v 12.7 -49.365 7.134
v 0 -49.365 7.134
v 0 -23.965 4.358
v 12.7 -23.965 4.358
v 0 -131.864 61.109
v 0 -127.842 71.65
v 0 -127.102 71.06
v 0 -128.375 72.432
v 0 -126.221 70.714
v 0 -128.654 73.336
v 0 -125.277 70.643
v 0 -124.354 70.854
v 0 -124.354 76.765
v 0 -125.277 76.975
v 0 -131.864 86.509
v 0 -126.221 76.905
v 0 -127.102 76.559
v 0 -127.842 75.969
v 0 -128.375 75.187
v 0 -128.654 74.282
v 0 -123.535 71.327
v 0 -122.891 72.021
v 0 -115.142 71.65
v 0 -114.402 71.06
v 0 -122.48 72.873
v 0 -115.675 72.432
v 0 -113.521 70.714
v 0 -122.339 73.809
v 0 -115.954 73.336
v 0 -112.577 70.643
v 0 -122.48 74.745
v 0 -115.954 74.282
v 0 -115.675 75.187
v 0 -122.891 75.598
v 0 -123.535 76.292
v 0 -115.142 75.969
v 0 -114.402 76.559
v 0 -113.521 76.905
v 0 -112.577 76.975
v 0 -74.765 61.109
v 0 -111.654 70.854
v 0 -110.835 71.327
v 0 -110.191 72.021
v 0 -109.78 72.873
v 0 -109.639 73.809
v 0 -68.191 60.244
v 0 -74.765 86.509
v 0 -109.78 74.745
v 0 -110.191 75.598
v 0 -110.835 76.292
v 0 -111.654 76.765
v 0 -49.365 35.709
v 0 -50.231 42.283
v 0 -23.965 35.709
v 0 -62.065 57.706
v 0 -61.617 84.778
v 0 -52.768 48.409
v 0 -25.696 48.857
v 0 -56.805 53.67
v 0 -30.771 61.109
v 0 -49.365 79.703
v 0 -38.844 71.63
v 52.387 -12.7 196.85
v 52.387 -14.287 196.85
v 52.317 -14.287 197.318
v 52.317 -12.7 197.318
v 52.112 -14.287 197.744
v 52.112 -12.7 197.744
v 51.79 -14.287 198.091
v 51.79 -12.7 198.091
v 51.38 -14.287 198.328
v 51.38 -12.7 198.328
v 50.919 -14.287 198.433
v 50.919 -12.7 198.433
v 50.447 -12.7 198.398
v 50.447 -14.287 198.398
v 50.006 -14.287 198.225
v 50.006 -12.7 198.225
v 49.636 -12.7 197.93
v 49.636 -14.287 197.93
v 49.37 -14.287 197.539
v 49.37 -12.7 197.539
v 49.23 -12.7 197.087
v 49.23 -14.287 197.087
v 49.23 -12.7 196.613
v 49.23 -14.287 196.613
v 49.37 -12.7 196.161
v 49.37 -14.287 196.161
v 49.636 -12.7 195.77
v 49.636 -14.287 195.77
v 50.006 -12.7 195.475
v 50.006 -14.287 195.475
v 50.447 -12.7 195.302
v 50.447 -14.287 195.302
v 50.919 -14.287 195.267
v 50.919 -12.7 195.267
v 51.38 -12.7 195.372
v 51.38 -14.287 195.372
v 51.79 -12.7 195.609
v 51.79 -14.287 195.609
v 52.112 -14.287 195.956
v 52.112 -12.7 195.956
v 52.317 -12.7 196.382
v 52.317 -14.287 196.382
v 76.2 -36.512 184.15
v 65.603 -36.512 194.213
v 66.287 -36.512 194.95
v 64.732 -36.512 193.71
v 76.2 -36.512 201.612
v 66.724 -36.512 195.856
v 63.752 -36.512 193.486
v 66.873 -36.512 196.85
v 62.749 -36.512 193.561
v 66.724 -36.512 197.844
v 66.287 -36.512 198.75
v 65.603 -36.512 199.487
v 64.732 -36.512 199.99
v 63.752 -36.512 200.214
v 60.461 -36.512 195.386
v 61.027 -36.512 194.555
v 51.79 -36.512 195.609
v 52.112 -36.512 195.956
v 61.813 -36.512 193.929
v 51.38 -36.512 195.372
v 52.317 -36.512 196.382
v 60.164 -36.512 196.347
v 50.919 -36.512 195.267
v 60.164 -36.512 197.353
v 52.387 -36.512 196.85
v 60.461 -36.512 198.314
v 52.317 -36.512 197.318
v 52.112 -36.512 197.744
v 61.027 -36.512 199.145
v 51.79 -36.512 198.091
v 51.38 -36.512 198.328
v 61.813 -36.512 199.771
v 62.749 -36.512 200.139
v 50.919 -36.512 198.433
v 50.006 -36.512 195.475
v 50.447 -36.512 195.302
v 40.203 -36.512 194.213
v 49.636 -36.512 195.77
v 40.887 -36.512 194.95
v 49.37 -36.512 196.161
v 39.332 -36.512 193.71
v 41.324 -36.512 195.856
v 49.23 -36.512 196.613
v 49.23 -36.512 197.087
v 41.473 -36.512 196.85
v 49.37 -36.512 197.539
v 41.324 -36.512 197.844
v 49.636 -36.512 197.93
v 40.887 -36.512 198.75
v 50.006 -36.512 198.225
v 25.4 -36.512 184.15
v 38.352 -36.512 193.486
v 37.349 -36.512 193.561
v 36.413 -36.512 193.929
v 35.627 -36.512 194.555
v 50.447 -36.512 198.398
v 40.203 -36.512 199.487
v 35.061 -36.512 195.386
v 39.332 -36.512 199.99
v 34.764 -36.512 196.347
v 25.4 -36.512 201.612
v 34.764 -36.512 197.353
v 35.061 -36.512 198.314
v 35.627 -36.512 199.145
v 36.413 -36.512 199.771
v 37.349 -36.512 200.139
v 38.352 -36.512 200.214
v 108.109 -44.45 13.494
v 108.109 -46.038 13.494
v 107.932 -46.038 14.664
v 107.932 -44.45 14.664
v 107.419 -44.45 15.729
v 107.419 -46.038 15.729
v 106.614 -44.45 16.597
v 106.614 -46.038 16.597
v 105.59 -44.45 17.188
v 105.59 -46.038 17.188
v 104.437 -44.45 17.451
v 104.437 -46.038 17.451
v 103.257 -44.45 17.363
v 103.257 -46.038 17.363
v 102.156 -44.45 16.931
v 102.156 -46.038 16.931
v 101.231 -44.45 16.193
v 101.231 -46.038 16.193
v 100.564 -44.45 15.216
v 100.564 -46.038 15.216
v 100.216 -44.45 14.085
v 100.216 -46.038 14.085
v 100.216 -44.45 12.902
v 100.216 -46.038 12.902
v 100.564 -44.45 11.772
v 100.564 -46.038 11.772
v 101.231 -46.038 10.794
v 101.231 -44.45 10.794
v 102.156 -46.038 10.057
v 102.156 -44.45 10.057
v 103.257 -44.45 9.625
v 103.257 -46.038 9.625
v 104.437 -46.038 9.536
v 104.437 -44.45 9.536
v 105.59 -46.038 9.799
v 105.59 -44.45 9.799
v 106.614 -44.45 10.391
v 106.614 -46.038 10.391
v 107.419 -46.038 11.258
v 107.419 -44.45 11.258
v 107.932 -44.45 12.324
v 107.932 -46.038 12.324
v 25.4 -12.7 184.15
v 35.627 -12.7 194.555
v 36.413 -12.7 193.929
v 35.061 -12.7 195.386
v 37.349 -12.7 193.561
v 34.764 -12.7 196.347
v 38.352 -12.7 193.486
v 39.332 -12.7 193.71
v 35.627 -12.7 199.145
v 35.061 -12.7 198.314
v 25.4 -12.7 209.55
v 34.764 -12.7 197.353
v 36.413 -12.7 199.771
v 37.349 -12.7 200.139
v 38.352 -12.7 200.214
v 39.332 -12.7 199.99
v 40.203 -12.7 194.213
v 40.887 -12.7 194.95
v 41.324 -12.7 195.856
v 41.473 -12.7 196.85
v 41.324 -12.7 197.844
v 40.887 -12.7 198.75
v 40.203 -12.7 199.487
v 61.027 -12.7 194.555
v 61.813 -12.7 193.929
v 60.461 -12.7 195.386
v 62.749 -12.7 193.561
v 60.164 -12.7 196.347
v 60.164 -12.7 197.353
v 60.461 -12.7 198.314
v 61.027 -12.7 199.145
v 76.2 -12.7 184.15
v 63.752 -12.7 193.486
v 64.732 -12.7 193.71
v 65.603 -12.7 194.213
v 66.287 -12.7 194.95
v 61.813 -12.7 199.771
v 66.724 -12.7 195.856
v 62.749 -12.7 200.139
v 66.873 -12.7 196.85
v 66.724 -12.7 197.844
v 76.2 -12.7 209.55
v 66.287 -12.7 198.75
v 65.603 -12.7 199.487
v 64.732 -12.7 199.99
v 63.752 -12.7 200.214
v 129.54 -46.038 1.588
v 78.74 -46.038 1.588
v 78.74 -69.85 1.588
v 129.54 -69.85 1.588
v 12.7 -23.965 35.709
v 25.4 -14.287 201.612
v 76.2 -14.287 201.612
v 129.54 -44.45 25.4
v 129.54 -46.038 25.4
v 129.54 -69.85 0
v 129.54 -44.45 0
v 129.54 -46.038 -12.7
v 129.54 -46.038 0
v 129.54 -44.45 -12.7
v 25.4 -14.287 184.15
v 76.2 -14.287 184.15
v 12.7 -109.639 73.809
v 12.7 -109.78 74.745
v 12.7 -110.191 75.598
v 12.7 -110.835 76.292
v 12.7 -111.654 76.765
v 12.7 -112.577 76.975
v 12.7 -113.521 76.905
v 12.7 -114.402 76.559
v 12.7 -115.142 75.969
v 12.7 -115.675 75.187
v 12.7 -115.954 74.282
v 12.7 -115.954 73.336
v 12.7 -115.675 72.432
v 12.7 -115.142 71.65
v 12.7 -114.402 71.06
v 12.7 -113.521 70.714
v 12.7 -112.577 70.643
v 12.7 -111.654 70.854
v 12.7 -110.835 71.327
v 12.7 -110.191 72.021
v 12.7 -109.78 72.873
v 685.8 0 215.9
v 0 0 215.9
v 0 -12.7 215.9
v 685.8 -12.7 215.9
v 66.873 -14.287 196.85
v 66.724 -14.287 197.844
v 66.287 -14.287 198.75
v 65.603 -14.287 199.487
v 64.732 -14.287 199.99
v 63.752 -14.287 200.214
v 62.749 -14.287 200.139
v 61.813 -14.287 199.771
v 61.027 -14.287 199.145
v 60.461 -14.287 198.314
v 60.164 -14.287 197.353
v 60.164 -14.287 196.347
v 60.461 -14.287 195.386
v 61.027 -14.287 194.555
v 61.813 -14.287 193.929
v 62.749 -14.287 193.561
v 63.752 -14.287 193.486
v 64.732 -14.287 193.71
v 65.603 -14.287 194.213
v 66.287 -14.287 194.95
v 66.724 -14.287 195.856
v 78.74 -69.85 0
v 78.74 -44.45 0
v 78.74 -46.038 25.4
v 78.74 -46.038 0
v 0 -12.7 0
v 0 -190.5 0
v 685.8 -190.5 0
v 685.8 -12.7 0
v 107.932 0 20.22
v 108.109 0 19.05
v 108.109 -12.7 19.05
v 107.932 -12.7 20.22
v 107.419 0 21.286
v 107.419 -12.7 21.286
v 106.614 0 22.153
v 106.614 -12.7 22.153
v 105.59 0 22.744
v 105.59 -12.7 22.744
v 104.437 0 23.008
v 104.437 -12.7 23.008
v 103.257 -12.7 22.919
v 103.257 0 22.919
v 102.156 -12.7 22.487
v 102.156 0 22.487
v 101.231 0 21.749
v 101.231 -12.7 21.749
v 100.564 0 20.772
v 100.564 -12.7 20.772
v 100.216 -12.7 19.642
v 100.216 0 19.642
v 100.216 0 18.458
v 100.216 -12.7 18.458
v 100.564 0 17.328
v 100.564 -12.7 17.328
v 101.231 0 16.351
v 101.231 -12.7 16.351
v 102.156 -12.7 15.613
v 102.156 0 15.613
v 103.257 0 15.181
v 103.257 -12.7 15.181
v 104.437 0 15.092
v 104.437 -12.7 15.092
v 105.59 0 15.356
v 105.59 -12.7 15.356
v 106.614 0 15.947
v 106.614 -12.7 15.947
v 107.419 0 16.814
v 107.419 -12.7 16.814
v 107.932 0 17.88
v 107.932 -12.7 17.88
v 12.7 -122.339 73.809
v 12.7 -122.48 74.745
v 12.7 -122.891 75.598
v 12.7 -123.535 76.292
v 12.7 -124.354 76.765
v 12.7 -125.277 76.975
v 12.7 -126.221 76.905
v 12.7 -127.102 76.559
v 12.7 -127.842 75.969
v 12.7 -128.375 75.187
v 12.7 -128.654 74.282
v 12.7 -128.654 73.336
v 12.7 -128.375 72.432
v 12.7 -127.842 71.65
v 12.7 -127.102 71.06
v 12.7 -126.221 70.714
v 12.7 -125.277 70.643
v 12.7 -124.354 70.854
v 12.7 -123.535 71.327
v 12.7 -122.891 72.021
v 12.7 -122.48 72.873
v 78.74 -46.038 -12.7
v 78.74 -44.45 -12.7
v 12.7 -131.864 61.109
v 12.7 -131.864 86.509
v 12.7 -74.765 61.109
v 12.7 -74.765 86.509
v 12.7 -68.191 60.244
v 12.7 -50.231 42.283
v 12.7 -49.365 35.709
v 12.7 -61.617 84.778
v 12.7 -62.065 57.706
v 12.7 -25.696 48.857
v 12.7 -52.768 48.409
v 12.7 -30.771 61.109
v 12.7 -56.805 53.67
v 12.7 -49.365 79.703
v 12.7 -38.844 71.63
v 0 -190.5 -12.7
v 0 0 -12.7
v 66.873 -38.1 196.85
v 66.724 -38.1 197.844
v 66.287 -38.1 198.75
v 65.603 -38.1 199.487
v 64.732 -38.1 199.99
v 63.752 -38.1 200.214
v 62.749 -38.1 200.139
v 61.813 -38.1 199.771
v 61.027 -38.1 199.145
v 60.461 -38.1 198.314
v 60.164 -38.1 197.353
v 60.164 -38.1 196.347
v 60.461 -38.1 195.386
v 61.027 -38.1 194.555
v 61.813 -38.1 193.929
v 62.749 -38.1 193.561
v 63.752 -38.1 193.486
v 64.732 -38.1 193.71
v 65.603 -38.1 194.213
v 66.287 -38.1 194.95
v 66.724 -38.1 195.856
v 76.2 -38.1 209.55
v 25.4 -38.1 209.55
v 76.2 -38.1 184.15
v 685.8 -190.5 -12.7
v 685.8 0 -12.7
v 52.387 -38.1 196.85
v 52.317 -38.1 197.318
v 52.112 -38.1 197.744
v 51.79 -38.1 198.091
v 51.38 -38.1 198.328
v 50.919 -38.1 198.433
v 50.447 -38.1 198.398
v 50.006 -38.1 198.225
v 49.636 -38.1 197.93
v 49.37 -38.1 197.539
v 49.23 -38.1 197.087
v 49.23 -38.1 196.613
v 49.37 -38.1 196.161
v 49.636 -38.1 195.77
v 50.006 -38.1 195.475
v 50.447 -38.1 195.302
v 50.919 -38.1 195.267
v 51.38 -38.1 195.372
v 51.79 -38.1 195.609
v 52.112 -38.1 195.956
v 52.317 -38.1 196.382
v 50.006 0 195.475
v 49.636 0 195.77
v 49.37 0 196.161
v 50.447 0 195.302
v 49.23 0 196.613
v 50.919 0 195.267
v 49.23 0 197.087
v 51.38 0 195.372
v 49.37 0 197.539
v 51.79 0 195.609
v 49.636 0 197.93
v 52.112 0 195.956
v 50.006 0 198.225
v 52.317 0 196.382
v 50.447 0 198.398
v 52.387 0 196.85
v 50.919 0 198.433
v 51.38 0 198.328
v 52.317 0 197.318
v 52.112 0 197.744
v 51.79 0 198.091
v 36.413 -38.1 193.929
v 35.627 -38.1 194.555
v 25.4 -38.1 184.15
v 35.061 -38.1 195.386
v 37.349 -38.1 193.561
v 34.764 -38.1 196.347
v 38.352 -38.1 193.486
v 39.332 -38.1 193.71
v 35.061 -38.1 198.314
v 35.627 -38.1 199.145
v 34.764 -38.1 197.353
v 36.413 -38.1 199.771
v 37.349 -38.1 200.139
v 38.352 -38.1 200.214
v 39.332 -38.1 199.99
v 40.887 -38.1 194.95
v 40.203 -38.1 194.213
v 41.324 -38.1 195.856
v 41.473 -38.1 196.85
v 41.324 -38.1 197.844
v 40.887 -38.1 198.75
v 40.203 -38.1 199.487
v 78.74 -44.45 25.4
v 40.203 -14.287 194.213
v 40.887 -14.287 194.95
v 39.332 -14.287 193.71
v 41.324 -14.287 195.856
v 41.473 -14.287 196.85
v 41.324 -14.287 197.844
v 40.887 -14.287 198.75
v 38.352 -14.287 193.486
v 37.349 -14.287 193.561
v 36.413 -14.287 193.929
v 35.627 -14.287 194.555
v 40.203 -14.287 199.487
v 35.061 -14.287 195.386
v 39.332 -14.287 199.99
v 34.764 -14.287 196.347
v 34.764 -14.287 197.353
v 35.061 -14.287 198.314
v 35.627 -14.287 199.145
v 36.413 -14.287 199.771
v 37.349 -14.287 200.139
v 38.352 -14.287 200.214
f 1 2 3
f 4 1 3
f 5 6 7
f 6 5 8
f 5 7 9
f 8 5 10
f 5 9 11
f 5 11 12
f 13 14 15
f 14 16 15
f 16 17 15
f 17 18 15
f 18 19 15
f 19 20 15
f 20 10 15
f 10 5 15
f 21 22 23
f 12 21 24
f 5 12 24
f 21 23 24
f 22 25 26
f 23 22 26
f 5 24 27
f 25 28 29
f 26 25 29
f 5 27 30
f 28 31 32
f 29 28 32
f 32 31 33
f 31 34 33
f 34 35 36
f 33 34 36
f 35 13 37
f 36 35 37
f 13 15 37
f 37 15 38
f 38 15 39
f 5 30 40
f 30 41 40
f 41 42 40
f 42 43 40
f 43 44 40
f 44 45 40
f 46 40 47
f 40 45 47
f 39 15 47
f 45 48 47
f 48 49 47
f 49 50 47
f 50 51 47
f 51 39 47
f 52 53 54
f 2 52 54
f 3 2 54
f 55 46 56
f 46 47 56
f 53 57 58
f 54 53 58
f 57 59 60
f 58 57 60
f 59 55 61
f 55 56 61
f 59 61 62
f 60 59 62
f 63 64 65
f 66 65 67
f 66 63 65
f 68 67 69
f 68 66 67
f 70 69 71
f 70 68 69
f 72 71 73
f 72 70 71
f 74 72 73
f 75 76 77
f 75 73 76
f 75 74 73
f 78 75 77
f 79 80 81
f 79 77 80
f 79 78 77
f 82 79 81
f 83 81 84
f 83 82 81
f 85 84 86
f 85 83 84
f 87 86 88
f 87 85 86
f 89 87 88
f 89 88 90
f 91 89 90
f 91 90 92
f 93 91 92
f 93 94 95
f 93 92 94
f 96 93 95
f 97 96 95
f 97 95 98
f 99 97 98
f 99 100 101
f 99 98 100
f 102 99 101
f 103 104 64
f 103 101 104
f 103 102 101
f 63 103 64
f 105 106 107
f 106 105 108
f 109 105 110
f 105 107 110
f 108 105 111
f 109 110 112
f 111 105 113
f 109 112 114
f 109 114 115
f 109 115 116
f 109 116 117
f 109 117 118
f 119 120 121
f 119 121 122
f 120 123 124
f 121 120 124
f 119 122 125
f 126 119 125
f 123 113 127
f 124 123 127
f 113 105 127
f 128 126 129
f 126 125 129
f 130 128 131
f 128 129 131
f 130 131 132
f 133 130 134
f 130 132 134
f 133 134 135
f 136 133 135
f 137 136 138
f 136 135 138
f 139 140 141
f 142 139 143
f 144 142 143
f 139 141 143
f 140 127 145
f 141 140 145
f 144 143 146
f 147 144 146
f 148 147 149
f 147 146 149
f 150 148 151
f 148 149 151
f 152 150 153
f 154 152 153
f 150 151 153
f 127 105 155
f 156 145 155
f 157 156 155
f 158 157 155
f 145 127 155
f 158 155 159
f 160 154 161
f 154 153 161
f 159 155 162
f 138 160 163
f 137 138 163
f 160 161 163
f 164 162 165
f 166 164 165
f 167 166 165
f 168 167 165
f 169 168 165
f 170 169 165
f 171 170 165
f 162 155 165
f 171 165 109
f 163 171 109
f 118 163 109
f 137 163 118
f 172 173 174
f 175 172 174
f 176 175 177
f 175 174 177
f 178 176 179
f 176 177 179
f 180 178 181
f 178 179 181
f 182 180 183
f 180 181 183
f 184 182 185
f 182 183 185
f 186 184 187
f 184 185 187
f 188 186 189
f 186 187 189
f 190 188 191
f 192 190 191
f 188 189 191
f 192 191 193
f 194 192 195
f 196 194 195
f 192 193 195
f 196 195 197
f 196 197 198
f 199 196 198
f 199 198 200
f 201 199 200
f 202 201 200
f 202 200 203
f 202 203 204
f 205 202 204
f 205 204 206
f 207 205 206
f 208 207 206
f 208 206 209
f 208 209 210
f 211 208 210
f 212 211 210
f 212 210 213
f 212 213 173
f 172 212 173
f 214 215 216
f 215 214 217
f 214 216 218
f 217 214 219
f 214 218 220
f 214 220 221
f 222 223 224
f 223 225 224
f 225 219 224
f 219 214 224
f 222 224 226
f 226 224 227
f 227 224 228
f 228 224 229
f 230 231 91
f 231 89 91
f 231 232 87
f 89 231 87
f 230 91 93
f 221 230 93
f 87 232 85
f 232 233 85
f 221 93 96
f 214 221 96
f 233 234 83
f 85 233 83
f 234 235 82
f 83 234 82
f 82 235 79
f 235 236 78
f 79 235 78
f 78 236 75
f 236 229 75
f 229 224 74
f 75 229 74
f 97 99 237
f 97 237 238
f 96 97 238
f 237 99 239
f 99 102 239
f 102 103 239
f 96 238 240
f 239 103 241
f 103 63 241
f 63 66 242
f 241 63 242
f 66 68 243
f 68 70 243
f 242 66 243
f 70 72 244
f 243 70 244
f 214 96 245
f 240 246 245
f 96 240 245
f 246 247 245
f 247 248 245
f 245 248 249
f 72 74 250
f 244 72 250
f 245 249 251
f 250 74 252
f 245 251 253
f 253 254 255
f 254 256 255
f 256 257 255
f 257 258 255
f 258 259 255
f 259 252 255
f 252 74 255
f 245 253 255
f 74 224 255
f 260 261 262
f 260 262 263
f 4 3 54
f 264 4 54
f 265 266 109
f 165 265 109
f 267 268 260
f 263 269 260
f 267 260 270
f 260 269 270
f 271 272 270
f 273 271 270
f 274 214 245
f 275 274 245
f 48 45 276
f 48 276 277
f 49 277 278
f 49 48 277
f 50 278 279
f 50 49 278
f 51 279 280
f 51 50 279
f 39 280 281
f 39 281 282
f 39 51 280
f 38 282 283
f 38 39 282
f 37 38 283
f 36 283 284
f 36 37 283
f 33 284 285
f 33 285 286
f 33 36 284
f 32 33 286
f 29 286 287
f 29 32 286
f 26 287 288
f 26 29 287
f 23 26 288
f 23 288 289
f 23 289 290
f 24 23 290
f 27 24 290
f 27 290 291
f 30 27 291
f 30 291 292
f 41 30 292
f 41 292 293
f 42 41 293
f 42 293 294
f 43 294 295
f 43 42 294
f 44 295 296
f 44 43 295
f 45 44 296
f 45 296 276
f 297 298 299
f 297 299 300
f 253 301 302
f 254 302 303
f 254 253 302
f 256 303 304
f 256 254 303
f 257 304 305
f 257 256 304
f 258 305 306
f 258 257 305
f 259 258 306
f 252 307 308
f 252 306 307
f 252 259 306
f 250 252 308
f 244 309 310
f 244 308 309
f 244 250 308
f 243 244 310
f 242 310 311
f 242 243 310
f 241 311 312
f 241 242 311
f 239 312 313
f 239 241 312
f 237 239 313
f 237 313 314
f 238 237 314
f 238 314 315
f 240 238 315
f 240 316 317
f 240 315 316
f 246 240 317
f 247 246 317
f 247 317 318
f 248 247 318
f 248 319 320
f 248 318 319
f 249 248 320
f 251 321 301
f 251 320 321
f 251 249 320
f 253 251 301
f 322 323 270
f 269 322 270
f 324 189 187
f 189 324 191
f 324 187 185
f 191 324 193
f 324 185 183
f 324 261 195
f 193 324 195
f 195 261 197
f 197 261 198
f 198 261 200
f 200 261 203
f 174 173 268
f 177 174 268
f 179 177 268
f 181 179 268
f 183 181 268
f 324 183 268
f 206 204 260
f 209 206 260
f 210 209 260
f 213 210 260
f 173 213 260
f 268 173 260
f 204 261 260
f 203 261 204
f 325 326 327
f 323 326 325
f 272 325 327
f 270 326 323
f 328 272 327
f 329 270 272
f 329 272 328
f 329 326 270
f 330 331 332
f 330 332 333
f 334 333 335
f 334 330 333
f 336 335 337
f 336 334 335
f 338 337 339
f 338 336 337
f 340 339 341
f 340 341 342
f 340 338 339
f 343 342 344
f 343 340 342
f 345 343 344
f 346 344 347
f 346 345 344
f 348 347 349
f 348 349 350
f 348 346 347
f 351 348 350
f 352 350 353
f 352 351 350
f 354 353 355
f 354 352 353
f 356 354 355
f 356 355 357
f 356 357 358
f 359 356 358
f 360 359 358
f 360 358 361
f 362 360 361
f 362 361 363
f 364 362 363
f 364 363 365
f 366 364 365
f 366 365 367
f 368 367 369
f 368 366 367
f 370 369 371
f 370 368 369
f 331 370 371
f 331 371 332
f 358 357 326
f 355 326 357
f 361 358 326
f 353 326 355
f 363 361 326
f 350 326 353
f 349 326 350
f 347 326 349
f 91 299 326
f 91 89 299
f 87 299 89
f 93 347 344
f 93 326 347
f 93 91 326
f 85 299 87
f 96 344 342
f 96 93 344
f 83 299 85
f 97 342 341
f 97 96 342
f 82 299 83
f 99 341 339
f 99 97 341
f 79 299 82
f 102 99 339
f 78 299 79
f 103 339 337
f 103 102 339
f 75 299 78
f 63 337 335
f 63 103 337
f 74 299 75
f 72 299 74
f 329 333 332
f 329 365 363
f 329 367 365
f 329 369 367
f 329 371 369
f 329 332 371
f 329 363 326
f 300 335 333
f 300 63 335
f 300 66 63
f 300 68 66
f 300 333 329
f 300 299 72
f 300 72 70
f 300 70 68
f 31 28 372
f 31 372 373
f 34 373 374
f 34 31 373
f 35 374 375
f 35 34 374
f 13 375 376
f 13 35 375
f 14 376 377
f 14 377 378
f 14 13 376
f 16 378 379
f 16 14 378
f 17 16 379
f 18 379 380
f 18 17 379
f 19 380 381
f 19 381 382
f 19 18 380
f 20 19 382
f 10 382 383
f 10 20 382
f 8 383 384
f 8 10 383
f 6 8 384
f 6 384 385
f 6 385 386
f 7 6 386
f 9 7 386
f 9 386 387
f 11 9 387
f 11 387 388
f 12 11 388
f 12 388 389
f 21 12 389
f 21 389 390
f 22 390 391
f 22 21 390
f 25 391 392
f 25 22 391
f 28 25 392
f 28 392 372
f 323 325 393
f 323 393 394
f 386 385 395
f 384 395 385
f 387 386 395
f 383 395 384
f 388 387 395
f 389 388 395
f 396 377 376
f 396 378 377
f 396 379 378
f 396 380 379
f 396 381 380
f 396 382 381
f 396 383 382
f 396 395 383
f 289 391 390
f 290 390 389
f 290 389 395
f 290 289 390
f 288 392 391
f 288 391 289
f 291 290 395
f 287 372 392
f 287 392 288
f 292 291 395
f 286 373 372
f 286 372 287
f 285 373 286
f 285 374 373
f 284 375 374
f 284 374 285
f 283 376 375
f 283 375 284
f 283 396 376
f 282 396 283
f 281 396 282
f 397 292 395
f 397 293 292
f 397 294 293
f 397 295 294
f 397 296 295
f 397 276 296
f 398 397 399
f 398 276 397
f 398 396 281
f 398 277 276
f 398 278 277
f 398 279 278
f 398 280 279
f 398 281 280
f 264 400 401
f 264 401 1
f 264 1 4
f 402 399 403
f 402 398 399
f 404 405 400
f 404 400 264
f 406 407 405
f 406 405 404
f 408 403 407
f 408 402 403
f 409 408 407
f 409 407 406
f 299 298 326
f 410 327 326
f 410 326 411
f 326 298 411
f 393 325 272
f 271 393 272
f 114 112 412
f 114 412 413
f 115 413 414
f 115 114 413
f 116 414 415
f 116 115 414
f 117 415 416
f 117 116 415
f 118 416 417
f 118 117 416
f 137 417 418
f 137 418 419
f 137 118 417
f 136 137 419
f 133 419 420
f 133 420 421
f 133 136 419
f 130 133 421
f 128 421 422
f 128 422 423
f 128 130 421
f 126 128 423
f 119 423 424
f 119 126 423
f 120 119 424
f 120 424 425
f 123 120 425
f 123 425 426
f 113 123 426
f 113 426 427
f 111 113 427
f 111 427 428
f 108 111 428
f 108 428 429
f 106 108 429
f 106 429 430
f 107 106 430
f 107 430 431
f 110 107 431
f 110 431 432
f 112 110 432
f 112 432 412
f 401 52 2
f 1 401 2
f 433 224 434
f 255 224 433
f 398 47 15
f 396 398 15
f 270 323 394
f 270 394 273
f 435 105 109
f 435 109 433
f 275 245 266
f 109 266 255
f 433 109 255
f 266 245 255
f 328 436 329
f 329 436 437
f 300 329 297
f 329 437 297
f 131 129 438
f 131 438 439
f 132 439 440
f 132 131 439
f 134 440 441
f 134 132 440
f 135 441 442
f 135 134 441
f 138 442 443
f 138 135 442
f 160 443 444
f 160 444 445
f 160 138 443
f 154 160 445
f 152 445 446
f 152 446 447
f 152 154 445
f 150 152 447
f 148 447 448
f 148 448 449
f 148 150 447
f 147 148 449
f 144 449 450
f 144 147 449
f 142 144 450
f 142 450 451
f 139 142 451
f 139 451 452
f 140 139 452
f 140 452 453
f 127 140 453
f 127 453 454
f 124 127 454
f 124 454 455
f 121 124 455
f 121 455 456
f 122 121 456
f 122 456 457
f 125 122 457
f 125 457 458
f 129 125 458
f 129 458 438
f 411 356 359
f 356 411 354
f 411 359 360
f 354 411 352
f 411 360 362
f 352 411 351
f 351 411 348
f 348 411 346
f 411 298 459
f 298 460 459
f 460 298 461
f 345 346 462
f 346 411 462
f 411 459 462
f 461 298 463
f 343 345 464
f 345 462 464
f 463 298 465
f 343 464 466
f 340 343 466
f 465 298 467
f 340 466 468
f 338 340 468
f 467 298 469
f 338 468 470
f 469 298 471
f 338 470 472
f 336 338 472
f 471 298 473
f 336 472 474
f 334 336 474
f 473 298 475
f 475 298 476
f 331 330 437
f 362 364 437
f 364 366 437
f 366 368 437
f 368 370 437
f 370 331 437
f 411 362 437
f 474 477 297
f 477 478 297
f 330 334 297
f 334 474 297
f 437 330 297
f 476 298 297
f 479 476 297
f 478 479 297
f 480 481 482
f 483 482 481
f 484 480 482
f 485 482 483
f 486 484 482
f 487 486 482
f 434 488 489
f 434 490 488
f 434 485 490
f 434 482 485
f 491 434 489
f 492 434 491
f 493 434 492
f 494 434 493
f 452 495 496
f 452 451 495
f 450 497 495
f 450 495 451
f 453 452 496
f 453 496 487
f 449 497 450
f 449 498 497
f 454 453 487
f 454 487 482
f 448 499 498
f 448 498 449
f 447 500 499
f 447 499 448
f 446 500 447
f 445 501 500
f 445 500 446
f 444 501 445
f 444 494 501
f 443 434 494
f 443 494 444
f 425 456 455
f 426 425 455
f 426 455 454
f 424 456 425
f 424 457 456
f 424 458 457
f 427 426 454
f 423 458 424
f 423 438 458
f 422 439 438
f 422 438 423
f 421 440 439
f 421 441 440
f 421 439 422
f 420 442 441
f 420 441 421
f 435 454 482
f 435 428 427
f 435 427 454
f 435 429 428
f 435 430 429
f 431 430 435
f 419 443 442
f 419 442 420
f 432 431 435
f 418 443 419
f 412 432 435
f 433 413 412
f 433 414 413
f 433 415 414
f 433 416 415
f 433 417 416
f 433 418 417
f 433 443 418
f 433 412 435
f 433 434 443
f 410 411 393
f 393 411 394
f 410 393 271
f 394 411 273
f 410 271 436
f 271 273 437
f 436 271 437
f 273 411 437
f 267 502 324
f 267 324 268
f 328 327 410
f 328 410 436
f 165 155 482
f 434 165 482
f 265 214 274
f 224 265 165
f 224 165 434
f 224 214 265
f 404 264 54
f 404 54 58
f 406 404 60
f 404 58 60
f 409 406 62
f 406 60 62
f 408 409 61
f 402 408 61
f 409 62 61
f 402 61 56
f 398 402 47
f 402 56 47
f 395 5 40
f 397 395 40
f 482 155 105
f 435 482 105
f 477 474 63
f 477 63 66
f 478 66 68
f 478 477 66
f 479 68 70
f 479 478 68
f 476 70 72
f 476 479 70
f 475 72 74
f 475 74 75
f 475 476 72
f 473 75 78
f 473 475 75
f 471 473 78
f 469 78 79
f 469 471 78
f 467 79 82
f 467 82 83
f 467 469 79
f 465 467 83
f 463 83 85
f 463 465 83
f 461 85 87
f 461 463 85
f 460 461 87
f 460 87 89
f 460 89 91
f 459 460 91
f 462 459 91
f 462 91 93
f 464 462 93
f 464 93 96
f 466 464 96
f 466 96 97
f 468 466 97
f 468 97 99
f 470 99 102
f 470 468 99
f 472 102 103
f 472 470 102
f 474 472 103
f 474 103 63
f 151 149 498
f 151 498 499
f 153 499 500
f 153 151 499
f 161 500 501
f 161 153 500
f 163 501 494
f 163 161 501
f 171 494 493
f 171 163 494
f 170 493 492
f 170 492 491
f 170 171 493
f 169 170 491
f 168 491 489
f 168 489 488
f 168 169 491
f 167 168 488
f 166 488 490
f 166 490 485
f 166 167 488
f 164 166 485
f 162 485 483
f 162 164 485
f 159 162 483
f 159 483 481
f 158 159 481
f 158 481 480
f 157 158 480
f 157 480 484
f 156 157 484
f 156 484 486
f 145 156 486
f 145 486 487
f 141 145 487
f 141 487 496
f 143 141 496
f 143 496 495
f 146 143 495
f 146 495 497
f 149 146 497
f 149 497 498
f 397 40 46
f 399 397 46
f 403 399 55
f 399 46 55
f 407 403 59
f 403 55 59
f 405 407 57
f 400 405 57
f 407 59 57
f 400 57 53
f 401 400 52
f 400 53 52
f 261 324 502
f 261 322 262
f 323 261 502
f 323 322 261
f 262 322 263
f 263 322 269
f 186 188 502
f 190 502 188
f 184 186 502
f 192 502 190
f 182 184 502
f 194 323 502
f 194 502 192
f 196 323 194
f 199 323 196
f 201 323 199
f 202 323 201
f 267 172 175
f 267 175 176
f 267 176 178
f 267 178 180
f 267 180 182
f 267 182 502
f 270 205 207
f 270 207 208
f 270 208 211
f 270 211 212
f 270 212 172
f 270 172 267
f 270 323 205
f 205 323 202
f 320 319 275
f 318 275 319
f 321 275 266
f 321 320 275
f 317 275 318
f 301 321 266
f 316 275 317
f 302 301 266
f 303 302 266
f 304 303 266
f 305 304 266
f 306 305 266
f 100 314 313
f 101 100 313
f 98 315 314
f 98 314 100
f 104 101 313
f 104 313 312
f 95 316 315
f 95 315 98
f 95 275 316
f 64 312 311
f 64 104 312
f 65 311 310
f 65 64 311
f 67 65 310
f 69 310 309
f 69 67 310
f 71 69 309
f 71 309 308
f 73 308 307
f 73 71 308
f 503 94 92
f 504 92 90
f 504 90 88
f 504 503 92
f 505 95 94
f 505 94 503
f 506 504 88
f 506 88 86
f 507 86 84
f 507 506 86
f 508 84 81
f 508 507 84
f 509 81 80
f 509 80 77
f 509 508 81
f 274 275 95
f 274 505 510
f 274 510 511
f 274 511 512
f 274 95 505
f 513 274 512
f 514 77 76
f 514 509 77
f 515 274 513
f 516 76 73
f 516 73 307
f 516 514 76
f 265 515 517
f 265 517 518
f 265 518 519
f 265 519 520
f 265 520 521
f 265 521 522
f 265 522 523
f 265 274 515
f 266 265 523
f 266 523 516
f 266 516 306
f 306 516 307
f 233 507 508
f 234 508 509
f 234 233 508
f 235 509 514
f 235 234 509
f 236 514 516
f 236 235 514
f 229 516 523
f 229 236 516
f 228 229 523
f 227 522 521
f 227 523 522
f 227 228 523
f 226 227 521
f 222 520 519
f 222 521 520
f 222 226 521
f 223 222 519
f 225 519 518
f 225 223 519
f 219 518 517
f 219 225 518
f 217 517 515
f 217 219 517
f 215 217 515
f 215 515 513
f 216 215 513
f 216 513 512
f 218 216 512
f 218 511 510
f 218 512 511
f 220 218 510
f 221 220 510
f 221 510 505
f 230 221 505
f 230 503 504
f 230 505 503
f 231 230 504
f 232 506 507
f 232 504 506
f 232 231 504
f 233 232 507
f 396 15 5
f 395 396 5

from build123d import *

# Parameters (mm, degrees)
F0_W      = 685.8
F0_H      = 215.9
F0_R      = 3.96875
F0_R_2    = 1.5875
F0_H_2    = 12.7
F1_DEPTH  = 12.7
F2_R      = 3.175
F3_DEPTH  = 12.7
F4_DEPTH  = 190.5
F5_W      = 50.8
F5_H      = 25.4
F6_DEPTH  = 1.5875
F7_W      = 50.8
F7_H      = 1.5875
F8_DEPTH  = 23.8125
F9_DEPTH  = 14.2885
F10_W     = 50.8
F10_H     = 25.4
F10_R     = 3.3734375
F10_R_2   = 1.5875
F11_DEPTH = 25.4
F12_W     = 22.225
F12_H     = 17.4625
F13_DEPTH = 660.401
F14_R     = 3.96875
F15_DEPTH = 46.0385


# Not quite as in the source:
# - a feature names something its author has since deleted; it is built from what else it names


with BuildPart() as f1:
    # F0 (on Front) → F1 (new body)
    with BuildSketch(Plane.XZ):
        with Locations((342.9, 107.95)):
            Rectangle(F0_W, F0_H)
        with Locations((104.14, 19.05)):
            Circle(F0_R, mode=Mode.SUBTRACT)
        with Locations((50.8, 196.85)):
            Circle(F0_R_2, mode=Mode.SUBTRACT)
        with Locations((342.9, -6.35)):
            Rectangle(F0_W, F0_H_2)
    extrude(amount=F1_DEPTH)

    # F0 (on Front) → F4 (join)
    with BuildSketch(Plane.XZ):
        with Locations((342.9, -6.35)):
            Rectangle(F0_W, F0_H_2)
    extrude(amount=F4_DEPTH)

    # F7 (on face) → F9 (cut, through all)
    with BuildSketch(Plane.XY.offset(1.5875)):
        with Locations((104.14, -45.24375)):
            Rectangle(F7_W, F7_H)
    extrude(amount=-F9_DEPTH, mode=Mode.SUBTRACT)


with BuildPart() as f3:
    # F2 (on Right) → F3 (new body)
    with BuildSketch(Plane.YZ):
        with BuildLine():
            Line((-131.8643205314, 86.509236245), (-131.8643205314, 61.109236245))
            Line((-131.8643205314, 61.109236245), (-74.7654969597, 61.109236245))
            ThreePointArc((-74.7654969597, 61.109236245), (-56.8049847175, 53.6697484872), (-49.3654969597, 35.709236245))
            Line((-49.3654969597, 35.709236245), (-49.3654969597, 7.134236245))
            Line((-49.3654969597, 7.134236245), (-23.9654969597, 4.357630532))
            Line((-23.9654969597, 4.357630532), (-23.9654969597, 35.709236245))
            ThreePointArc((-23.9654969597, 35.709236245), (-38.8444724754, 71.6302607293), (-74.7654969597, 86.509236245))
            Line((-74.7654969597, 86.509236245), (-131.8643205314, 86.509236245))
        make_face()
        with Locations((-125.5143205314, 73.809236245)):
            Circle(F2_R, mode=Mode.SUBTRACT)
        with Locations((-112.8143205314, 73.809236245)):
            Circle(F2_R, mode=Mode.SUBTRACT)
    extrude(amount=F3_DEPTH)


with BuildPart() as f6:
    # F5 (on face) → F6 (new body)
    with BuildSketch(Plane.XY):
        with Locations((104.14, -57.15)):
            Rectangle(F5_W, F5_H)
    extrude(amount=F6_DEPTH)

    # F7 (on face) → F8 (join)
    with BuildSketch(Plane.XY.offset(1.5875)):
        with Locations((104.14, -45.24375)):
            Rectangle(F7_W, F7_H)
    extrude(amount=F8_DEPTH)

    # F14 (on face) → F15 (cut, through all)
    with BuildSketch(Plane.XZ.offset(46.0375)):
        with Locations((104.14, 13.49375)):
            Circle(F14_R)
    extrude(amount=-F15_DEPTH, mode=Mode.SUBTRACT)


with BuildPart() as f11:
    # F10 (on face) → F11 (new body)
    with BuildSketch(Plane.XZ.offset(12.7)):
        with Locations((50.8, 196.85)):
            Rectangle(F10_W, F10_H)
        with Locations((38.1, 196.85)):
            Circle(F10_R, mode=Mode.SUBTRACT)
        with Locations((50.8, 196.85)):
            Circle(F10_R_2, mode=Mode.SUBTRACT)
        with Locations((63.5, 196.85)):
            Circle(F10_R, mode=Mode.SUBTRACT)
    extrude(amount=F11_DEPTH)

    # F12 (on face) → F13 (cut, through all)
    with BuildSketch(Plane(origin=(25.4, 0, 0), x_dir=(0, -1, 0), z_dir=(-1, 0, 0))):
        with Locations((25.4, 192.88125)):
            Rectangle(F12_W, F12_H)
    extrude(amount=-F13_DEPTH, mode=Mode.SUBTRACT)


solid = Compound([f1.part, f3.part, f6.part, f11.part])
